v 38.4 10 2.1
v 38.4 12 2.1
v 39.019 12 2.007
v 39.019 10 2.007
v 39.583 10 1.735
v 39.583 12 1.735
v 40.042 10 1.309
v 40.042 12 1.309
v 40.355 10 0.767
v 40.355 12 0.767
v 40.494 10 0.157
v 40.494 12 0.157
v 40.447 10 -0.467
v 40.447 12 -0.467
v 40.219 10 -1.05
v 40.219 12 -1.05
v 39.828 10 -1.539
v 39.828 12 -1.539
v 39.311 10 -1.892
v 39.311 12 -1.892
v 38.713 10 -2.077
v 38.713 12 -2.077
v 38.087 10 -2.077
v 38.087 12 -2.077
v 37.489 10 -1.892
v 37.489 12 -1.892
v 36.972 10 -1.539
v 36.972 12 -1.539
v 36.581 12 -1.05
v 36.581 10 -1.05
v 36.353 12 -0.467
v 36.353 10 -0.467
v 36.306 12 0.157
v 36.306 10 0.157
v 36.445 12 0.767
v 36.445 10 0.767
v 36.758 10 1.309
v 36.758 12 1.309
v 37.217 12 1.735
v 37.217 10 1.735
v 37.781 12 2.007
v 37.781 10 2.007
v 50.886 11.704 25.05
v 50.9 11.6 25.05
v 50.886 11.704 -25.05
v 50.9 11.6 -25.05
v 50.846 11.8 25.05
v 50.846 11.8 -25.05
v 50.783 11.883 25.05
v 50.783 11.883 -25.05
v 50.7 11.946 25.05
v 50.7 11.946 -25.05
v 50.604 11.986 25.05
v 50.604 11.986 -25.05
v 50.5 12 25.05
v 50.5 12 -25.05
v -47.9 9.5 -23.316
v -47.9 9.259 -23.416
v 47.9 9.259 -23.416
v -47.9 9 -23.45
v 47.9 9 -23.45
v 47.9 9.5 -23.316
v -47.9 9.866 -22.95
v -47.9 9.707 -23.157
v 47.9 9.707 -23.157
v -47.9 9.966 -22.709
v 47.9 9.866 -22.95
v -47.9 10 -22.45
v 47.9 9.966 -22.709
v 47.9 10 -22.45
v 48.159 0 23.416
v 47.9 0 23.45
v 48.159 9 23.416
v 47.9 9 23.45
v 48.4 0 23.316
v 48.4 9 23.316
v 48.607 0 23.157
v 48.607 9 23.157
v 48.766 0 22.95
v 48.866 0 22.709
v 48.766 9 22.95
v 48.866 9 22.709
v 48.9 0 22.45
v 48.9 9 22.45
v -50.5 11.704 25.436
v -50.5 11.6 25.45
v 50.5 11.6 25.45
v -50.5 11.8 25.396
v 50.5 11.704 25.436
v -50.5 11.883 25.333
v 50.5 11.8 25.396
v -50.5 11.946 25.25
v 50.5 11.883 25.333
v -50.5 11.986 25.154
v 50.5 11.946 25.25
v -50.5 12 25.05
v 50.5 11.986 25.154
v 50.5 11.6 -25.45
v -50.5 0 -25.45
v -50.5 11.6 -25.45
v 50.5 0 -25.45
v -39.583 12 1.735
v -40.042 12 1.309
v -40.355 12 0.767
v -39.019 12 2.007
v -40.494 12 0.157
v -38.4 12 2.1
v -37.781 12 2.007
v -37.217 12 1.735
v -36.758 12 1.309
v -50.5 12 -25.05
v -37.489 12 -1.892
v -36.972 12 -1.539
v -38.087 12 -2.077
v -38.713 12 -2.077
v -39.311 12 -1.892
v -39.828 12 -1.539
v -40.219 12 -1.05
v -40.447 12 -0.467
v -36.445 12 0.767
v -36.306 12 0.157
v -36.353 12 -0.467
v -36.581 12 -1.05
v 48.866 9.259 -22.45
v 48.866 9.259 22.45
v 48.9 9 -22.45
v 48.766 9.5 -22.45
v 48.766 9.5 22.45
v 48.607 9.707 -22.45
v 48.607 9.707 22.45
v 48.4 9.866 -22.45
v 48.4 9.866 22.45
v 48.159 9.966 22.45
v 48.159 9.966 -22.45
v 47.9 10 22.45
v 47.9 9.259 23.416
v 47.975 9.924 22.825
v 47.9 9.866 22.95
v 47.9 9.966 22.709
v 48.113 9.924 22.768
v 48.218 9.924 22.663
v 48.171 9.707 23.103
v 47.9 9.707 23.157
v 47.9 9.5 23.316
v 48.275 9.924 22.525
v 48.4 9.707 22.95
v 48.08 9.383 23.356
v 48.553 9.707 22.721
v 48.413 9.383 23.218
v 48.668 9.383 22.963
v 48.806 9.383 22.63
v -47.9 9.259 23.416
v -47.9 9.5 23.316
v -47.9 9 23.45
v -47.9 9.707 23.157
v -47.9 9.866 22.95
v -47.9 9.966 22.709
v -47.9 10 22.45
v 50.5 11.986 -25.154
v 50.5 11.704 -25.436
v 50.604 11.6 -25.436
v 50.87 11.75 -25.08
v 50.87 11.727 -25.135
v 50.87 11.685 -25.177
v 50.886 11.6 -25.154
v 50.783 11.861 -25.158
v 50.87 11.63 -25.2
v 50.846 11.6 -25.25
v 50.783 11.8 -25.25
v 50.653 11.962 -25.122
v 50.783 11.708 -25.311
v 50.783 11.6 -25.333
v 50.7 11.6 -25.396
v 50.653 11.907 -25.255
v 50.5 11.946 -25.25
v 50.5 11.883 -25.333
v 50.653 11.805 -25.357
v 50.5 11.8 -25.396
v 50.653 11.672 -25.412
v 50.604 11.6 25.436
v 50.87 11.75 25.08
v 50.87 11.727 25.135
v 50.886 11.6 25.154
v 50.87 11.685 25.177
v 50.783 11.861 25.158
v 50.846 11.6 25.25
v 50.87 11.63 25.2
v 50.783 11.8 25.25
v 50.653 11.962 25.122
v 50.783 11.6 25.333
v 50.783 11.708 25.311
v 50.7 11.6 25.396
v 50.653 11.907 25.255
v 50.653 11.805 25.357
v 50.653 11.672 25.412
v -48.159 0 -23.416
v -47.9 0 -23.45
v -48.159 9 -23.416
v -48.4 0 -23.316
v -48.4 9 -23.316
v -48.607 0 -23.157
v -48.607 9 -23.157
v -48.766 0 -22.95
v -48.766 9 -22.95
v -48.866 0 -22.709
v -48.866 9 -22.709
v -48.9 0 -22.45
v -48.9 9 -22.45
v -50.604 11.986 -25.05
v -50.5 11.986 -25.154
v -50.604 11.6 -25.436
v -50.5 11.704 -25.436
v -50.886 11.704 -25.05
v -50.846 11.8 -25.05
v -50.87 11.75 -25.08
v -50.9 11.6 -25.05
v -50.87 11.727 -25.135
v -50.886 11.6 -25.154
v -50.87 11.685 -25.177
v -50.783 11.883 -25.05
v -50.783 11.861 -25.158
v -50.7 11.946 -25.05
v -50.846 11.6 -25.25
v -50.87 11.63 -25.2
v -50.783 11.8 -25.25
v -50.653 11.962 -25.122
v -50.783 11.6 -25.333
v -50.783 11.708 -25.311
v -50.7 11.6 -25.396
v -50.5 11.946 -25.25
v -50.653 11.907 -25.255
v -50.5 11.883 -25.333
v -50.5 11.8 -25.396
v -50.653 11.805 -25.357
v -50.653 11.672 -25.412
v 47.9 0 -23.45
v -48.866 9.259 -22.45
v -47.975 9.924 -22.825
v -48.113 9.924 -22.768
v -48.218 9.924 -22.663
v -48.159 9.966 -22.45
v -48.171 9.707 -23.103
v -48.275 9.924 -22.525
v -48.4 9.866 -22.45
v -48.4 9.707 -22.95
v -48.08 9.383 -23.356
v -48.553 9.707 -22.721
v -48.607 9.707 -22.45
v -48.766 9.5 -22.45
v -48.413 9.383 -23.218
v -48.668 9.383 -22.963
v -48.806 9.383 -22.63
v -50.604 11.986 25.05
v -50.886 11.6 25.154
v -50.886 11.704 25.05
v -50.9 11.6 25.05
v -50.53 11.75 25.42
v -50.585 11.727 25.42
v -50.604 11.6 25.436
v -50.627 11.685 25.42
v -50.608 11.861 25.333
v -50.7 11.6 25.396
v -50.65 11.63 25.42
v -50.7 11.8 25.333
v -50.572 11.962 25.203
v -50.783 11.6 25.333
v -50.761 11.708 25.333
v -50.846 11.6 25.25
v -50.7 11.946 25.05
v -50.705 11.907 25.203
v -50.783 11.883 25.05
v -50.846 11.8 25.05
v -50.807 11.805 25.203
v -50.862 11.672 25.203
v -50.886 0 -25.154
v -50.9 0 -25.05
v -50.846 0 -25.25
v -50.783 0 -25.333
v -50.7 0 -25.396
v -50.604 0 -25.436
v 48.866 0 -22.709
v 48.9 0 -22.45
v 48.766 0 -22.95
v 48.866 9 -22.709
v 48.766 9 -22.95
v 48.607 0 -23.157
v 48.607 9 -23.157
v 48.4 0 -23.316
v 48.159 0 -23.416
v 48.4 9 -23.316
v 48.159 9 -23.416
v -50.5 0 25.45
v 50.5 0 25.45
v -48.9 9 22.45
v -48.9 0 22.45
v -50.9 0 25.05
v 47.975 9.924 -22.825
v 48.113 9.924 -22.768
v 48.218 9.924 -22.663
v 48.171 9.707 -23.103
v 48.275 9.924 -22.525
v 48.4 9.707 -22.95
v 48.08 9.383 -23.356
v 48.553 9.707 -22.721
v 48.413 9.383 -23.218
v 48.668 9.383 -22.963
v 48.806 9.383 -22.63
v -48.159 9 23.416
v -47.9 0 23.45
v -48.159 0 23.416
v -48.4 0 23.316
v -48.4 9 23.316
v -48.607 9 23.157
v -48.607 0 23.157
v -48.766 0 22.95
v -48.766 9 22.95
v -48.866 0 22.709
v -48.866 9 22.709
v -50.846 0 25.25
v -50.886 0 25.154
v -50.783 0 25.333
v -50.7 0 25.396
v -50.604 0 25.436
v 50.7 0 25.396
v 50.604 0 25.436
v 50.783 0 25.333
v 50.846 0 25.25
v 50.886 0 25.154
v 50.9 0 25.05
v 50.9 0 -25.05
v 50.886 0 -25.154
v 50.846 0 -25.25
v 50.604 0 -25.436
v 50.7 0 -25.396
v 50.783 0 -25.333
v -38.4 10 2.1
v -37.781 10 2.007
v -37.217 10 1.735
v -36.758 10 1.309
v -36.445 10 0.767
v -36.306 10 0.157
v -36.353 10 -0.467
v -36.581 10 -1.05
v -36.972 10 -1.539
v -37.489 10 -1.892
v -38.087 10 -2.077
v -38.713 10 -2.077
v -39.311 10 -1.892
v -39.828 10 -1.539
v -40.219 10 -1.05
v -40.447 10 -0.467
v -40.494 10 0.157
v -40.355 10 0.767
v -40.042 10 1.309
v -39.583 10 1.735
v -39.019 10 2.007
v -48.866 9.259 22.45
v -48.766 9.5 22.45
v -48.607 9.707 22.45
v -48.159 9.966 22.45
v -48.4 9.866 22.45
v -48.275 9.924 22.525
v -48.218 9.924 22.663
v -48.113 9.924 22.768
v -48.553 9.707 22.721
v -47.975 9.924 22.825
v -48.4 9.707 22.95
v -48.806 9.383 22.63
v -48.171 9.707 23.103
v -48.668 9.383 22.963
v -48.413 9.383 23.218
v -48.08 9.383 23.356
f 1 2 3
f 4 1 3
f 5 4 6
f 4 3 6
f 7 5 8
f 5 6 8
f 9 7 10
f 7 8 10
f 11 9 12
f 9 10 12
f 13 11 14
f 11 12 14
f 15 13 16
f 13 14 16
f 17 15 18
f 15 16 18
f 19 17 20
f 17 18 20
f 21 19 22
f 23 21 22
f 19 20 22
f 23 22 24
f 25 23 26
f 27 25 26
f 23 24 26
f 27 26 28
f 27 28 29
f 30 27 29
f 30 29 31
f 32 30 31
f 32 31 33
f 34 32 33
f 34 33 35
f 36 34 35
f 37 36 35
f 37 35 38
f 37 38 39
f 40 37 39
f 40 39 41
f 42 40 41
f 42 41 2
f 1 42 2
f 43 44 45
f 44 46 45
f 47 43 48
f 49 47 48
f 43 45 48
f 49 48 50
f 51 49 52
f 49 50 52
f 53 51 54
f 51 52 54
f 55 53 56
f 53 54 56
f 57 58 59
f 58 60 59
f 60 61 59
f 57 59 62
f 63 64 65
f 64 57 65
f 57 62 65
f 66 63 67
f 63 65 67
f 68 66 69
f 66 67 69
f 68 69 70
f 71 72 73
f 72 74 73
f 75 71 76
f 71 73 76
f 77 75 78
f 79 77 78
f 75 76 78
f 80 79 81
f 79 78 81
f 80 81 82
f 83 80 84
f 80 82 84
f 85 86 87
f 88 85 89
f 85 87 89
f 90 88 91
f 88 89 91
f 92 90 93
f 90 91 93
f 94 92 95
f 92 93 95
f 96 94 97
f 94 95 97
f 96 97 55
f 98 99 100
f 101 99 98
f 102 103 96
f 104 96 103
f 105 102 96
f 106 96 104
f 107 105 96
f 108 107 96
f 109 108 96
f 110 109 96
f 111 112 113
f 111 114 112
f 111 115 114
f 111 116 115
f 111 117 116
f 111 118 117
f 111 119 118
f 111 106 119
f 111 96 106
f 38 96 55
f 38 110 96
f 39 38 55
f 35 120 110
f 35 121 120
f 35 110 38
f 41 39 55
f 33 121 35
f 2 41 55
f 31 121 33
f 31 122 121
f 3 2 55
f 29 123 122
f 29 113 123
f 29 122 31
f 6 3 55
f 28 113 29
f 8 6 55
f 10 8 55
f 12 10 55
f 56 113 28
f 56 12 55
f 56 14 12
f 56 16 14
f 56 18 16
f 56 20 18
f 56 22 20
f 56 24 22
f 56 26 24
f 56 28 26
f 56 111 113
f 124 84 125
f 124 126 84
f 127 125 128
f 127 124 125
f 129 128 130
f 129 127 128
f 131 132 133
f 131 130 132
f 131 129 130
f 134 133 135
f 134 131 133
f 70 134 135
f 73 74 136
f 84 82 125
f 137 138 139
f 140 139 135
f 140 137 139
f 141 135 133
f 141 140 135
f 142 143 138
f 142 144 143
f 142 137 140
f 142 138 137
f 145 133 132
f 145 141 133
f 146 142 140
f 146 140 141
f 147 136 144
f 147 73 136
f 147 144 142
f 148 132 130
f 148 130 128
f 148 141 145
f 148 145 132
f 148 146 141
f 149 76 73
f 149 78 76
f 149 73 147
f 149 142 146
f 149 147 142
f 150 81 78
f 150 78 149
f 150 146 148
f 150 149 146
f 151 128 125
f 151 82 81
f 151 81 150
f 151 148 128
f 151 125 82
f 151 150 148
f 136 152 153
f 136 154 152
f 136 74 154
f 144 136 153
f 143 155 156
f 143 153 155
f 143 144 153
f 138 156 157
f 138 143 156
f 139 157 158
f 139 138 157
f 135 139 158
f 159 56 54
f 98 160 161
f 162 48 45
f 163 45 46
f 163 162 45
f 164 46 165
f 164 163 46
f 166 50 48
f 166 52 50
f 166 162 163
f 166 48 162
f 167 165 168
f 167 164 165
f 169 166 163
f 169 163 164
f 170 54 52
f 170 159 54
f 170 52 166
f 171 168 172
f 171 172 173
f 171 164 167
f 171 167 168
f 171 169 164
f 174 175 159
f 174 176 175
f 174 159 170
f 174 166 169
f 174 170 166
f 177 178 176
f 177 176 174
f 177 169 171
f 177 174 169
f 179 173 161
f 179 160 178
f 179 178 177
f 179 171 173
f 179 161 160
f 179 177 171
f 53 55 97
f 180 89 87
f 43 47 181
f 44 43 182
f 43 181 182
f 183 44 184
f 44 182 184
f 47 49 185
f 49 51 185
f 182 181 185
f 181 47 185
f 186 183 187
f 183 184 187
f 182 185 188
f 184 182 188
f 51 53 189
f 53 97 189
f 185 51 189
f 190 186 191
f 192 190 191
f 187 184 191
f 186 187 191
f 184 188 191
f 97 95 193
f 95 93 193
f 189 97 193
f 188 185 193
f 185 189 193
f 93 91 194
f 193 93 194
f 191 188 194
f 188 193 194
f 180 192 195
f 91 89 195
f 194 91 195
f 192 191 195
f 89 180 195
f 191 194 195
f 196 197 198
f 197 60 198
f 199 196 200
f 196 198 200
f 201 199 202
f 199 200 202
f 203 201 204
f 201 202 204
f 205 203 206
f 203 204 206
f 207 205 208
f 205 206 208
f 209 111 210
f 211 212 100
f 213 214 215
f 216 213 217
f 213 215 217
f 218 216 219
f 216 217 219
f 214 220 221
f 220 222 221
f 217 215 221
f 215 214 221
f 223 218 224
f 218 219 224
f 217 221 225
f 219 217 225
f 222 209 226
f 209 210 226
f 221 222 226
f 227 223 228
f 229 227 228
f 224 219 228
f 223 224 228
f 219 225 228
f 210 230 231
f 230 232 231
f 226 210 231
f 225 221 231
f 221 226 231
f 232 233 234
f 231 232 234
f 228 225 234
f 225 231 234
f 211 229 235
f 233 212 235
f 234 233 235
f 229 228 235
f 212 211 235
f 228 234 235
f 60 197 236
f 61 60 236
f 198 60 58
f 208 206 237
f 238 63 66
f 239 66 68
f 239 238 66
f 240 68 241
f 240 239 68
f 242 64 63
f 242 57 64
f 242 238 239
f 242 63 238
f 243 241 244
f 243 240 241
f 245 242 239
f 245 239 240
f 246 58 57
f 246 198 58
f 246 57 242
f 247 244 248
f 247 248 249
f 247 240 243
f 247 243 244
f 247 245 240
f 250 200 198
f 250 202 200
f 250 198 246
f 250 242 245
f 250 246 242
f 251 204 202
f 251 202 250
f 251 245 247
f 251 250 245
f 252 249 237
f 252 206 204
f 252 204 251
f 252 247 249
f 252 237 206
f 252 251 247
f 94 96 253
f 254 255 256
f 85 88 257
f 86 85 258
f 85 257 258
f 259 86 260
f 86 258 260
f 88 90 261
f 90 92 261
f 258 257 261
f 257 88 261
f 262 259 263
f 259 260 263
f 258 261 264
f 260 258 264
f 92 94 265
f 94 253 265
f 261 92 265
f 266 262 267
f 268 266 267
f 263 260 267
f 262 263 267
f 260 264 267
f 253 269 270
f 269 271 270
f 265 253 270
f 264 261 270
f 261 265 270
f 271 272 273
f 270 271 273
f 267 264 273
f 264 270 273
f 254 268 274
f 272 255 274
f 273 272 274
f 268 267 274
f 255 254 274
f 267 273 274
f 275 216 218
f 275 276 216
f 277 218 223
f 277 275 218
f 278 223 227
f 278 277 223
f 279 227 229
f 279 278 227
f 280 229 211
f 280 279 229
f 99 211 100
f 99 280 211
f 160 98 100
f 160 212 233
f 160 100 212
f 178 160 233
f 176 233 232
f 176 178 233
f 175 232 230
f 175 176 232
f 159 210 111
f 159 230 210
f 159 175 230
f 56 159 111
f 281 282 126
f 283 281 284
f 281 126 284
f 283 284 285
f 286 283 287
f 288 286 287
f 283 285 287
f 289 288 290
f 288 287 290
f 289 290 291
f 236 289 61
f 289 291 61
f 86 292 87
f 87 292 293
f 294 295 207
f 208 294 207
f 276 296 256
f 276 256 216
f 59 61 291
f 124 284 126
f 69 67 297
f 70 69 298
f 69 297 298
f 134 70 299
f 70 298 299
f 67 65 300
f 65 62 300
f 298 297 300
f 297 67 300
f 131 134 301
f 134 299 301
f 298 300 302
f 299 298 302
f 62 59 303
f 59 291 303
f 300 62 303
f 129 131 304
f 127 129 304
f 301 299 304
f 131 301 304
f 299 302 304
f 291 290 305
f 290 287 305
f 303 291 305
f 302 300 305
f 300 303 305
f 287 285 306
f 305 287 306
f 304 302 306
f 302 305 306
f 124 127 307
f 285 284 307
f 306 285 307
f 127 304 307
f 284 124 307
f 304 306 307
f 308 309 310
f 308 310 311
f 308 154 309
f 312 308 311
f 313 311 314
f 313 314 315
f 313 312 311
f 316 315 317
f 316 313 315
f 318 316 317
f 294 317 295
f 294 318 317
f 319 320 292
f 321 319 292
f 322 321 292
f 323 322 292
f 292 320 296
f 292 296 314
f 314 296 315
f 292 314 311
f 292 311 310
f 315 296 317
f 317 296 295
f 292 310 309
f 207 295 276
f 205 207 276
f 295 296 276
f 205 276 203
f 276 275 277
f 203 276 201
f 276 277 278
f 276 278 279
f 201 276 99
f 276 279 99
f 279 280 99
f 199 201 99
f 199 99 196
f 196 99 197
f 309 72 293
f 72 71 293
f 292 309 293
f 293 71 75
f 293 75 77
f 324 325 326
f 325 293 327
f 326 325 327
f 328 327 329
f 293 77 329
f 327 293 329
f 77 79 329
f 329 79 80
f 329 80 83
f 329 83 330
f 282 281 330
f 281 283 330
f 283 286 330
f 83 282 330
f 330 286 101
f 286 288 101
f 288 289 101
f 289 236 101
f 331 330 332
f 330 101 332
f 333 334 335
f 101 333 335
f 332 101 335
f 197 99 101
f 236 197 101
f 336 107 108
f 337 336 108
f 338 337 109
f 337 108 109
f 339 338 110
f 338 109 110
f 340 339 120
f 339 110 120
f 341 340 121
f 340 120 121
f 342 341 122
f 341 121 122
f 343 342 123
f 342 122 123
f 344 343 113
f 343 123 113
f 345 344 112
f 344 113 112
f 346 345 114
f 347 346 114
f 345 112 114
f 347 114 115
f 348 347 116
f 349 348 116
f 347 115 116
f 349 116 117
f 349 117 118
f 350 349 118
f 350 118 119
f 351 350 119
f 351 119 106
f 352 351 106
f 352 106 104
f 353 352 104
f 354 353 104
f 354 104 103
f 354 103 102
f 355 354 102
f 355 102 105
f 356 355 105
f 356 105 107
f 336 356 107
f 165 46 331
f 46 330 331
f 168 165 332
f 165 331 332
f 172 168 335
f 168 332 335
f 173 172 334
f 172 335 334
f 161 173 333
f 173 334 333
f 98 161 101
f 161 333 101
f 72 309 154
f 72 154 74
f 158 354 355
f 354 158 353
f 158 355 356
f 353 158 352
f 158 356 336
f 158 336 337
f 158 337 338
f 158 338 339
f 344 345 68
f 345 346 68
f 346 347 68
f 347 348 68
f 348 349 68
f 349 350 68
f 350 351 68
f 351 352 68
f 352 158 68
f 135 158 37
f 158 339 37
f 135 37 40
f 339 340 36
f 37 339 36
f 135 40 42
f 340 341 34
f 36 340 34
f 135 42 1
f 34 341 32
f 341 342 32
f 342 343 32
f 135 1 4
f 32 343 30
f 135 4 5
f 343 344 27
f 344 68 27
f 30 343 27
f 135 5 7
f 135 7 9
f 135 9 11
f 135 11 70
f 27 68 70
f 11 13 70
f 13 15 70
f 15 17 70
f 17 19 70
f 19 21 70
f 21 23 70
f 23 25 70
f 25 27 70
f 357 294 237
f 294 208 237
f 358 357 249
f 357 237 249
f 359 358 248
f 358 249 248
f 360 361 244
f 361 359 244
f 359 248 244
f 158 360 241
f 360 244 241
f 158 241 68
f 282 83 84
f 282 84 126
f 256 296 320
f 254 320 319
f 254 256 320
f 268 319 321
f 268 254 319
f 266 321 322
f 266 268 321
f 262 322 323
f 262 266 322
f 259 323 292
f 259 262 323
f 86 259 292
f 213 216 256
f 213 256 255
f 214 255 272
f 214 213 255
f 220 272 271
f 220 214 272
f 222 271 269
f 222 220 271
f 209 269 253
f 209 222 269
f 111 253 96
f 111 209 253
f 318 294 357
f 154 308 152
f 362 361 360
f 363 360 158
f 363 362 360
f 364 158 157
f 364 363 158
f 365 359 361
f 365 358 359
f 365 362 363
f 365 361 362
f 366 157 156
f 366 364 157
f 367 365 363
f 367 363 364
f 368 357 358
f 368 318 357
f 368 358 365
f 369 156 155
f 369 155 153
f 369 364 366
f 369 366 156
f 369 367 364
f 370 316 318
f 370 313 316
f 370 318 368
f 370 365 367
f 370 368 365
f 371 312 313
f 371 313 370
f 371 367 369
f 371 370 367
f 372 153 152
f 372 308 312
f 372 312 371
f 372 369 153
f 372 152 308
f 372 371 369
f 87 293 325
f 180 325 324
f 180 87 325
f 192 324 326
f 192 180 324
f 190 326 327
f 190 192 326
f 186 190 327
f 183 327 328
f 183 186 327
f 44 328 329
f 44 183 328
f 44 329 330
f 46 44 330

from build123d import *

# Parameters (mm, degrees)
SKETCH1_W             = 101.8
SKETCH1_H             = 50.9
SKETCH1_W_2           = 97.8
SKETCH1_H_2           = 46.9
MAIN_BODY_DEPTH       = 10
SKETCH4_W             = 101.8
SKETCH4_H             = 50.9
TOP_DEPTH             = 2
OUTER_FILLET_0_2MM_R  = 0.4
INNER_FILLET_1MM_R    = 1
HOLES_CUT_4_2MM_REACH = 60.159
SKETCH6_R             = 2.1


with BuildPart() as part:
    # Sketch1 → Main Body (new body)
    with BuildSketch(Plane(origin=(0, 0, 0), x_dir=(1, 0, 0), z_dir=(0, 1, 0))):
        Rectangle(SKETCH1_W, SKETCH1_H)
        Rectangle(SKETCH1_W_2, SKETCH1_H_2, mode=Mode.SUBTRACT)
    extrude(amount=MAIN_BODY_DEPTH)

    # Sketch4 → Top (add)
    with BuildSketch(Plane(origin=(0, 10, 0), x_dir=(1, 0, 0), z_dir=(0, 1, 0))):
        Rectangle(SKETCH4_W, SKETCH4_H)
    extrude(amount=TOP_DEPTH)

    # Outer Fillet 0.2mm
    outer_fillet_0_2mm_edges = [part.edges().sort_by_distance(p)[0] for p in [
        (0, 12, -25.45),
        (-50.9, 12, 0),
        (0, 12, 25.45),
        (50.9, 12, 0),
        (-50.9, 6, -25.45),
        (50.9, 6, -25.45),
        (50.9, 6, 25.45),
        (-50.9, 6, 25.45),
    ]]
    fillet(outer_fillet_0_2mm_edges, radius=OUTER_FILLET_0_2MM_R)

    # Inner Fillet 1mm
    inner_fillet_1mm_edges = [part.edges().sort_by_distance(p)[0] for p in [
        (48.9, 5, -23.45),
        (-48.9, 5, -23.45),
        (-48.9, 5, 23.45),
        (48.9, 5, 23.45),
        (0, 10, -23.45),
        (-48.9, 10, 0),
        (0, 10, 23.45),
        (48.9, 10, 0),
    ]]
    fillet(inner_fillet_1mm_edges, radius=INNER_FILLET_1MM_R)

    # Sketch6 → Holes Cut 4.2mm (cut, up to next)
    with BuildSketch(Plane(origin=(0, 12, 0), x_dir=(1, 0, 0), z_dir=(0, 1, 0)), mode=Mode.PRIVATE) as holes_cut_4_2mm_sk1:
        with Locations(Location((-38.4, 0, 0), (0, 0, 270))):
            Circle(SKETCH6_R)
    holes_cut_4_2mm_tool1 = extrude(holes_cut_4_2mm_sk1.sketch, amount=-HOLES_CUT_4_2MM_REACH, mode=Mode.PRIVATE) & part.part
    # Sketch6 → Holes Cut 4.2mm (cut, up to next)
    with BuildSketch(Plane(origin=(0, 12, 0), x_dir=(1, 0, 0), z_dir=(0, 1, 0)), mode=Mode.PRIVATE) as holes_cut_4_2mm_sk2:
        with Locations(Location((38.4, 0, 0), (0, 0, 270))):
            Circle(SKETCH6_R)
    holes_cut_4_2mm_tool2 = extrude(holes_cut_4_2mm_sk2.sketch, amount=-HOLES_CUT_4_2MM_REACH, mode=Mode.PRIVATE) & part.part
    add(holes_cut_4_2mm_tool1.solids().sort_by_distance((-38.4, 12, 0))[0], mode=Mode.SUBTRACT)
    add(holes_cut_4_2mm_tool2.solids().sort_by_distance((38.4, 12, 0))[0], mode=Mode.SUBTRACT)


solid = part.part
